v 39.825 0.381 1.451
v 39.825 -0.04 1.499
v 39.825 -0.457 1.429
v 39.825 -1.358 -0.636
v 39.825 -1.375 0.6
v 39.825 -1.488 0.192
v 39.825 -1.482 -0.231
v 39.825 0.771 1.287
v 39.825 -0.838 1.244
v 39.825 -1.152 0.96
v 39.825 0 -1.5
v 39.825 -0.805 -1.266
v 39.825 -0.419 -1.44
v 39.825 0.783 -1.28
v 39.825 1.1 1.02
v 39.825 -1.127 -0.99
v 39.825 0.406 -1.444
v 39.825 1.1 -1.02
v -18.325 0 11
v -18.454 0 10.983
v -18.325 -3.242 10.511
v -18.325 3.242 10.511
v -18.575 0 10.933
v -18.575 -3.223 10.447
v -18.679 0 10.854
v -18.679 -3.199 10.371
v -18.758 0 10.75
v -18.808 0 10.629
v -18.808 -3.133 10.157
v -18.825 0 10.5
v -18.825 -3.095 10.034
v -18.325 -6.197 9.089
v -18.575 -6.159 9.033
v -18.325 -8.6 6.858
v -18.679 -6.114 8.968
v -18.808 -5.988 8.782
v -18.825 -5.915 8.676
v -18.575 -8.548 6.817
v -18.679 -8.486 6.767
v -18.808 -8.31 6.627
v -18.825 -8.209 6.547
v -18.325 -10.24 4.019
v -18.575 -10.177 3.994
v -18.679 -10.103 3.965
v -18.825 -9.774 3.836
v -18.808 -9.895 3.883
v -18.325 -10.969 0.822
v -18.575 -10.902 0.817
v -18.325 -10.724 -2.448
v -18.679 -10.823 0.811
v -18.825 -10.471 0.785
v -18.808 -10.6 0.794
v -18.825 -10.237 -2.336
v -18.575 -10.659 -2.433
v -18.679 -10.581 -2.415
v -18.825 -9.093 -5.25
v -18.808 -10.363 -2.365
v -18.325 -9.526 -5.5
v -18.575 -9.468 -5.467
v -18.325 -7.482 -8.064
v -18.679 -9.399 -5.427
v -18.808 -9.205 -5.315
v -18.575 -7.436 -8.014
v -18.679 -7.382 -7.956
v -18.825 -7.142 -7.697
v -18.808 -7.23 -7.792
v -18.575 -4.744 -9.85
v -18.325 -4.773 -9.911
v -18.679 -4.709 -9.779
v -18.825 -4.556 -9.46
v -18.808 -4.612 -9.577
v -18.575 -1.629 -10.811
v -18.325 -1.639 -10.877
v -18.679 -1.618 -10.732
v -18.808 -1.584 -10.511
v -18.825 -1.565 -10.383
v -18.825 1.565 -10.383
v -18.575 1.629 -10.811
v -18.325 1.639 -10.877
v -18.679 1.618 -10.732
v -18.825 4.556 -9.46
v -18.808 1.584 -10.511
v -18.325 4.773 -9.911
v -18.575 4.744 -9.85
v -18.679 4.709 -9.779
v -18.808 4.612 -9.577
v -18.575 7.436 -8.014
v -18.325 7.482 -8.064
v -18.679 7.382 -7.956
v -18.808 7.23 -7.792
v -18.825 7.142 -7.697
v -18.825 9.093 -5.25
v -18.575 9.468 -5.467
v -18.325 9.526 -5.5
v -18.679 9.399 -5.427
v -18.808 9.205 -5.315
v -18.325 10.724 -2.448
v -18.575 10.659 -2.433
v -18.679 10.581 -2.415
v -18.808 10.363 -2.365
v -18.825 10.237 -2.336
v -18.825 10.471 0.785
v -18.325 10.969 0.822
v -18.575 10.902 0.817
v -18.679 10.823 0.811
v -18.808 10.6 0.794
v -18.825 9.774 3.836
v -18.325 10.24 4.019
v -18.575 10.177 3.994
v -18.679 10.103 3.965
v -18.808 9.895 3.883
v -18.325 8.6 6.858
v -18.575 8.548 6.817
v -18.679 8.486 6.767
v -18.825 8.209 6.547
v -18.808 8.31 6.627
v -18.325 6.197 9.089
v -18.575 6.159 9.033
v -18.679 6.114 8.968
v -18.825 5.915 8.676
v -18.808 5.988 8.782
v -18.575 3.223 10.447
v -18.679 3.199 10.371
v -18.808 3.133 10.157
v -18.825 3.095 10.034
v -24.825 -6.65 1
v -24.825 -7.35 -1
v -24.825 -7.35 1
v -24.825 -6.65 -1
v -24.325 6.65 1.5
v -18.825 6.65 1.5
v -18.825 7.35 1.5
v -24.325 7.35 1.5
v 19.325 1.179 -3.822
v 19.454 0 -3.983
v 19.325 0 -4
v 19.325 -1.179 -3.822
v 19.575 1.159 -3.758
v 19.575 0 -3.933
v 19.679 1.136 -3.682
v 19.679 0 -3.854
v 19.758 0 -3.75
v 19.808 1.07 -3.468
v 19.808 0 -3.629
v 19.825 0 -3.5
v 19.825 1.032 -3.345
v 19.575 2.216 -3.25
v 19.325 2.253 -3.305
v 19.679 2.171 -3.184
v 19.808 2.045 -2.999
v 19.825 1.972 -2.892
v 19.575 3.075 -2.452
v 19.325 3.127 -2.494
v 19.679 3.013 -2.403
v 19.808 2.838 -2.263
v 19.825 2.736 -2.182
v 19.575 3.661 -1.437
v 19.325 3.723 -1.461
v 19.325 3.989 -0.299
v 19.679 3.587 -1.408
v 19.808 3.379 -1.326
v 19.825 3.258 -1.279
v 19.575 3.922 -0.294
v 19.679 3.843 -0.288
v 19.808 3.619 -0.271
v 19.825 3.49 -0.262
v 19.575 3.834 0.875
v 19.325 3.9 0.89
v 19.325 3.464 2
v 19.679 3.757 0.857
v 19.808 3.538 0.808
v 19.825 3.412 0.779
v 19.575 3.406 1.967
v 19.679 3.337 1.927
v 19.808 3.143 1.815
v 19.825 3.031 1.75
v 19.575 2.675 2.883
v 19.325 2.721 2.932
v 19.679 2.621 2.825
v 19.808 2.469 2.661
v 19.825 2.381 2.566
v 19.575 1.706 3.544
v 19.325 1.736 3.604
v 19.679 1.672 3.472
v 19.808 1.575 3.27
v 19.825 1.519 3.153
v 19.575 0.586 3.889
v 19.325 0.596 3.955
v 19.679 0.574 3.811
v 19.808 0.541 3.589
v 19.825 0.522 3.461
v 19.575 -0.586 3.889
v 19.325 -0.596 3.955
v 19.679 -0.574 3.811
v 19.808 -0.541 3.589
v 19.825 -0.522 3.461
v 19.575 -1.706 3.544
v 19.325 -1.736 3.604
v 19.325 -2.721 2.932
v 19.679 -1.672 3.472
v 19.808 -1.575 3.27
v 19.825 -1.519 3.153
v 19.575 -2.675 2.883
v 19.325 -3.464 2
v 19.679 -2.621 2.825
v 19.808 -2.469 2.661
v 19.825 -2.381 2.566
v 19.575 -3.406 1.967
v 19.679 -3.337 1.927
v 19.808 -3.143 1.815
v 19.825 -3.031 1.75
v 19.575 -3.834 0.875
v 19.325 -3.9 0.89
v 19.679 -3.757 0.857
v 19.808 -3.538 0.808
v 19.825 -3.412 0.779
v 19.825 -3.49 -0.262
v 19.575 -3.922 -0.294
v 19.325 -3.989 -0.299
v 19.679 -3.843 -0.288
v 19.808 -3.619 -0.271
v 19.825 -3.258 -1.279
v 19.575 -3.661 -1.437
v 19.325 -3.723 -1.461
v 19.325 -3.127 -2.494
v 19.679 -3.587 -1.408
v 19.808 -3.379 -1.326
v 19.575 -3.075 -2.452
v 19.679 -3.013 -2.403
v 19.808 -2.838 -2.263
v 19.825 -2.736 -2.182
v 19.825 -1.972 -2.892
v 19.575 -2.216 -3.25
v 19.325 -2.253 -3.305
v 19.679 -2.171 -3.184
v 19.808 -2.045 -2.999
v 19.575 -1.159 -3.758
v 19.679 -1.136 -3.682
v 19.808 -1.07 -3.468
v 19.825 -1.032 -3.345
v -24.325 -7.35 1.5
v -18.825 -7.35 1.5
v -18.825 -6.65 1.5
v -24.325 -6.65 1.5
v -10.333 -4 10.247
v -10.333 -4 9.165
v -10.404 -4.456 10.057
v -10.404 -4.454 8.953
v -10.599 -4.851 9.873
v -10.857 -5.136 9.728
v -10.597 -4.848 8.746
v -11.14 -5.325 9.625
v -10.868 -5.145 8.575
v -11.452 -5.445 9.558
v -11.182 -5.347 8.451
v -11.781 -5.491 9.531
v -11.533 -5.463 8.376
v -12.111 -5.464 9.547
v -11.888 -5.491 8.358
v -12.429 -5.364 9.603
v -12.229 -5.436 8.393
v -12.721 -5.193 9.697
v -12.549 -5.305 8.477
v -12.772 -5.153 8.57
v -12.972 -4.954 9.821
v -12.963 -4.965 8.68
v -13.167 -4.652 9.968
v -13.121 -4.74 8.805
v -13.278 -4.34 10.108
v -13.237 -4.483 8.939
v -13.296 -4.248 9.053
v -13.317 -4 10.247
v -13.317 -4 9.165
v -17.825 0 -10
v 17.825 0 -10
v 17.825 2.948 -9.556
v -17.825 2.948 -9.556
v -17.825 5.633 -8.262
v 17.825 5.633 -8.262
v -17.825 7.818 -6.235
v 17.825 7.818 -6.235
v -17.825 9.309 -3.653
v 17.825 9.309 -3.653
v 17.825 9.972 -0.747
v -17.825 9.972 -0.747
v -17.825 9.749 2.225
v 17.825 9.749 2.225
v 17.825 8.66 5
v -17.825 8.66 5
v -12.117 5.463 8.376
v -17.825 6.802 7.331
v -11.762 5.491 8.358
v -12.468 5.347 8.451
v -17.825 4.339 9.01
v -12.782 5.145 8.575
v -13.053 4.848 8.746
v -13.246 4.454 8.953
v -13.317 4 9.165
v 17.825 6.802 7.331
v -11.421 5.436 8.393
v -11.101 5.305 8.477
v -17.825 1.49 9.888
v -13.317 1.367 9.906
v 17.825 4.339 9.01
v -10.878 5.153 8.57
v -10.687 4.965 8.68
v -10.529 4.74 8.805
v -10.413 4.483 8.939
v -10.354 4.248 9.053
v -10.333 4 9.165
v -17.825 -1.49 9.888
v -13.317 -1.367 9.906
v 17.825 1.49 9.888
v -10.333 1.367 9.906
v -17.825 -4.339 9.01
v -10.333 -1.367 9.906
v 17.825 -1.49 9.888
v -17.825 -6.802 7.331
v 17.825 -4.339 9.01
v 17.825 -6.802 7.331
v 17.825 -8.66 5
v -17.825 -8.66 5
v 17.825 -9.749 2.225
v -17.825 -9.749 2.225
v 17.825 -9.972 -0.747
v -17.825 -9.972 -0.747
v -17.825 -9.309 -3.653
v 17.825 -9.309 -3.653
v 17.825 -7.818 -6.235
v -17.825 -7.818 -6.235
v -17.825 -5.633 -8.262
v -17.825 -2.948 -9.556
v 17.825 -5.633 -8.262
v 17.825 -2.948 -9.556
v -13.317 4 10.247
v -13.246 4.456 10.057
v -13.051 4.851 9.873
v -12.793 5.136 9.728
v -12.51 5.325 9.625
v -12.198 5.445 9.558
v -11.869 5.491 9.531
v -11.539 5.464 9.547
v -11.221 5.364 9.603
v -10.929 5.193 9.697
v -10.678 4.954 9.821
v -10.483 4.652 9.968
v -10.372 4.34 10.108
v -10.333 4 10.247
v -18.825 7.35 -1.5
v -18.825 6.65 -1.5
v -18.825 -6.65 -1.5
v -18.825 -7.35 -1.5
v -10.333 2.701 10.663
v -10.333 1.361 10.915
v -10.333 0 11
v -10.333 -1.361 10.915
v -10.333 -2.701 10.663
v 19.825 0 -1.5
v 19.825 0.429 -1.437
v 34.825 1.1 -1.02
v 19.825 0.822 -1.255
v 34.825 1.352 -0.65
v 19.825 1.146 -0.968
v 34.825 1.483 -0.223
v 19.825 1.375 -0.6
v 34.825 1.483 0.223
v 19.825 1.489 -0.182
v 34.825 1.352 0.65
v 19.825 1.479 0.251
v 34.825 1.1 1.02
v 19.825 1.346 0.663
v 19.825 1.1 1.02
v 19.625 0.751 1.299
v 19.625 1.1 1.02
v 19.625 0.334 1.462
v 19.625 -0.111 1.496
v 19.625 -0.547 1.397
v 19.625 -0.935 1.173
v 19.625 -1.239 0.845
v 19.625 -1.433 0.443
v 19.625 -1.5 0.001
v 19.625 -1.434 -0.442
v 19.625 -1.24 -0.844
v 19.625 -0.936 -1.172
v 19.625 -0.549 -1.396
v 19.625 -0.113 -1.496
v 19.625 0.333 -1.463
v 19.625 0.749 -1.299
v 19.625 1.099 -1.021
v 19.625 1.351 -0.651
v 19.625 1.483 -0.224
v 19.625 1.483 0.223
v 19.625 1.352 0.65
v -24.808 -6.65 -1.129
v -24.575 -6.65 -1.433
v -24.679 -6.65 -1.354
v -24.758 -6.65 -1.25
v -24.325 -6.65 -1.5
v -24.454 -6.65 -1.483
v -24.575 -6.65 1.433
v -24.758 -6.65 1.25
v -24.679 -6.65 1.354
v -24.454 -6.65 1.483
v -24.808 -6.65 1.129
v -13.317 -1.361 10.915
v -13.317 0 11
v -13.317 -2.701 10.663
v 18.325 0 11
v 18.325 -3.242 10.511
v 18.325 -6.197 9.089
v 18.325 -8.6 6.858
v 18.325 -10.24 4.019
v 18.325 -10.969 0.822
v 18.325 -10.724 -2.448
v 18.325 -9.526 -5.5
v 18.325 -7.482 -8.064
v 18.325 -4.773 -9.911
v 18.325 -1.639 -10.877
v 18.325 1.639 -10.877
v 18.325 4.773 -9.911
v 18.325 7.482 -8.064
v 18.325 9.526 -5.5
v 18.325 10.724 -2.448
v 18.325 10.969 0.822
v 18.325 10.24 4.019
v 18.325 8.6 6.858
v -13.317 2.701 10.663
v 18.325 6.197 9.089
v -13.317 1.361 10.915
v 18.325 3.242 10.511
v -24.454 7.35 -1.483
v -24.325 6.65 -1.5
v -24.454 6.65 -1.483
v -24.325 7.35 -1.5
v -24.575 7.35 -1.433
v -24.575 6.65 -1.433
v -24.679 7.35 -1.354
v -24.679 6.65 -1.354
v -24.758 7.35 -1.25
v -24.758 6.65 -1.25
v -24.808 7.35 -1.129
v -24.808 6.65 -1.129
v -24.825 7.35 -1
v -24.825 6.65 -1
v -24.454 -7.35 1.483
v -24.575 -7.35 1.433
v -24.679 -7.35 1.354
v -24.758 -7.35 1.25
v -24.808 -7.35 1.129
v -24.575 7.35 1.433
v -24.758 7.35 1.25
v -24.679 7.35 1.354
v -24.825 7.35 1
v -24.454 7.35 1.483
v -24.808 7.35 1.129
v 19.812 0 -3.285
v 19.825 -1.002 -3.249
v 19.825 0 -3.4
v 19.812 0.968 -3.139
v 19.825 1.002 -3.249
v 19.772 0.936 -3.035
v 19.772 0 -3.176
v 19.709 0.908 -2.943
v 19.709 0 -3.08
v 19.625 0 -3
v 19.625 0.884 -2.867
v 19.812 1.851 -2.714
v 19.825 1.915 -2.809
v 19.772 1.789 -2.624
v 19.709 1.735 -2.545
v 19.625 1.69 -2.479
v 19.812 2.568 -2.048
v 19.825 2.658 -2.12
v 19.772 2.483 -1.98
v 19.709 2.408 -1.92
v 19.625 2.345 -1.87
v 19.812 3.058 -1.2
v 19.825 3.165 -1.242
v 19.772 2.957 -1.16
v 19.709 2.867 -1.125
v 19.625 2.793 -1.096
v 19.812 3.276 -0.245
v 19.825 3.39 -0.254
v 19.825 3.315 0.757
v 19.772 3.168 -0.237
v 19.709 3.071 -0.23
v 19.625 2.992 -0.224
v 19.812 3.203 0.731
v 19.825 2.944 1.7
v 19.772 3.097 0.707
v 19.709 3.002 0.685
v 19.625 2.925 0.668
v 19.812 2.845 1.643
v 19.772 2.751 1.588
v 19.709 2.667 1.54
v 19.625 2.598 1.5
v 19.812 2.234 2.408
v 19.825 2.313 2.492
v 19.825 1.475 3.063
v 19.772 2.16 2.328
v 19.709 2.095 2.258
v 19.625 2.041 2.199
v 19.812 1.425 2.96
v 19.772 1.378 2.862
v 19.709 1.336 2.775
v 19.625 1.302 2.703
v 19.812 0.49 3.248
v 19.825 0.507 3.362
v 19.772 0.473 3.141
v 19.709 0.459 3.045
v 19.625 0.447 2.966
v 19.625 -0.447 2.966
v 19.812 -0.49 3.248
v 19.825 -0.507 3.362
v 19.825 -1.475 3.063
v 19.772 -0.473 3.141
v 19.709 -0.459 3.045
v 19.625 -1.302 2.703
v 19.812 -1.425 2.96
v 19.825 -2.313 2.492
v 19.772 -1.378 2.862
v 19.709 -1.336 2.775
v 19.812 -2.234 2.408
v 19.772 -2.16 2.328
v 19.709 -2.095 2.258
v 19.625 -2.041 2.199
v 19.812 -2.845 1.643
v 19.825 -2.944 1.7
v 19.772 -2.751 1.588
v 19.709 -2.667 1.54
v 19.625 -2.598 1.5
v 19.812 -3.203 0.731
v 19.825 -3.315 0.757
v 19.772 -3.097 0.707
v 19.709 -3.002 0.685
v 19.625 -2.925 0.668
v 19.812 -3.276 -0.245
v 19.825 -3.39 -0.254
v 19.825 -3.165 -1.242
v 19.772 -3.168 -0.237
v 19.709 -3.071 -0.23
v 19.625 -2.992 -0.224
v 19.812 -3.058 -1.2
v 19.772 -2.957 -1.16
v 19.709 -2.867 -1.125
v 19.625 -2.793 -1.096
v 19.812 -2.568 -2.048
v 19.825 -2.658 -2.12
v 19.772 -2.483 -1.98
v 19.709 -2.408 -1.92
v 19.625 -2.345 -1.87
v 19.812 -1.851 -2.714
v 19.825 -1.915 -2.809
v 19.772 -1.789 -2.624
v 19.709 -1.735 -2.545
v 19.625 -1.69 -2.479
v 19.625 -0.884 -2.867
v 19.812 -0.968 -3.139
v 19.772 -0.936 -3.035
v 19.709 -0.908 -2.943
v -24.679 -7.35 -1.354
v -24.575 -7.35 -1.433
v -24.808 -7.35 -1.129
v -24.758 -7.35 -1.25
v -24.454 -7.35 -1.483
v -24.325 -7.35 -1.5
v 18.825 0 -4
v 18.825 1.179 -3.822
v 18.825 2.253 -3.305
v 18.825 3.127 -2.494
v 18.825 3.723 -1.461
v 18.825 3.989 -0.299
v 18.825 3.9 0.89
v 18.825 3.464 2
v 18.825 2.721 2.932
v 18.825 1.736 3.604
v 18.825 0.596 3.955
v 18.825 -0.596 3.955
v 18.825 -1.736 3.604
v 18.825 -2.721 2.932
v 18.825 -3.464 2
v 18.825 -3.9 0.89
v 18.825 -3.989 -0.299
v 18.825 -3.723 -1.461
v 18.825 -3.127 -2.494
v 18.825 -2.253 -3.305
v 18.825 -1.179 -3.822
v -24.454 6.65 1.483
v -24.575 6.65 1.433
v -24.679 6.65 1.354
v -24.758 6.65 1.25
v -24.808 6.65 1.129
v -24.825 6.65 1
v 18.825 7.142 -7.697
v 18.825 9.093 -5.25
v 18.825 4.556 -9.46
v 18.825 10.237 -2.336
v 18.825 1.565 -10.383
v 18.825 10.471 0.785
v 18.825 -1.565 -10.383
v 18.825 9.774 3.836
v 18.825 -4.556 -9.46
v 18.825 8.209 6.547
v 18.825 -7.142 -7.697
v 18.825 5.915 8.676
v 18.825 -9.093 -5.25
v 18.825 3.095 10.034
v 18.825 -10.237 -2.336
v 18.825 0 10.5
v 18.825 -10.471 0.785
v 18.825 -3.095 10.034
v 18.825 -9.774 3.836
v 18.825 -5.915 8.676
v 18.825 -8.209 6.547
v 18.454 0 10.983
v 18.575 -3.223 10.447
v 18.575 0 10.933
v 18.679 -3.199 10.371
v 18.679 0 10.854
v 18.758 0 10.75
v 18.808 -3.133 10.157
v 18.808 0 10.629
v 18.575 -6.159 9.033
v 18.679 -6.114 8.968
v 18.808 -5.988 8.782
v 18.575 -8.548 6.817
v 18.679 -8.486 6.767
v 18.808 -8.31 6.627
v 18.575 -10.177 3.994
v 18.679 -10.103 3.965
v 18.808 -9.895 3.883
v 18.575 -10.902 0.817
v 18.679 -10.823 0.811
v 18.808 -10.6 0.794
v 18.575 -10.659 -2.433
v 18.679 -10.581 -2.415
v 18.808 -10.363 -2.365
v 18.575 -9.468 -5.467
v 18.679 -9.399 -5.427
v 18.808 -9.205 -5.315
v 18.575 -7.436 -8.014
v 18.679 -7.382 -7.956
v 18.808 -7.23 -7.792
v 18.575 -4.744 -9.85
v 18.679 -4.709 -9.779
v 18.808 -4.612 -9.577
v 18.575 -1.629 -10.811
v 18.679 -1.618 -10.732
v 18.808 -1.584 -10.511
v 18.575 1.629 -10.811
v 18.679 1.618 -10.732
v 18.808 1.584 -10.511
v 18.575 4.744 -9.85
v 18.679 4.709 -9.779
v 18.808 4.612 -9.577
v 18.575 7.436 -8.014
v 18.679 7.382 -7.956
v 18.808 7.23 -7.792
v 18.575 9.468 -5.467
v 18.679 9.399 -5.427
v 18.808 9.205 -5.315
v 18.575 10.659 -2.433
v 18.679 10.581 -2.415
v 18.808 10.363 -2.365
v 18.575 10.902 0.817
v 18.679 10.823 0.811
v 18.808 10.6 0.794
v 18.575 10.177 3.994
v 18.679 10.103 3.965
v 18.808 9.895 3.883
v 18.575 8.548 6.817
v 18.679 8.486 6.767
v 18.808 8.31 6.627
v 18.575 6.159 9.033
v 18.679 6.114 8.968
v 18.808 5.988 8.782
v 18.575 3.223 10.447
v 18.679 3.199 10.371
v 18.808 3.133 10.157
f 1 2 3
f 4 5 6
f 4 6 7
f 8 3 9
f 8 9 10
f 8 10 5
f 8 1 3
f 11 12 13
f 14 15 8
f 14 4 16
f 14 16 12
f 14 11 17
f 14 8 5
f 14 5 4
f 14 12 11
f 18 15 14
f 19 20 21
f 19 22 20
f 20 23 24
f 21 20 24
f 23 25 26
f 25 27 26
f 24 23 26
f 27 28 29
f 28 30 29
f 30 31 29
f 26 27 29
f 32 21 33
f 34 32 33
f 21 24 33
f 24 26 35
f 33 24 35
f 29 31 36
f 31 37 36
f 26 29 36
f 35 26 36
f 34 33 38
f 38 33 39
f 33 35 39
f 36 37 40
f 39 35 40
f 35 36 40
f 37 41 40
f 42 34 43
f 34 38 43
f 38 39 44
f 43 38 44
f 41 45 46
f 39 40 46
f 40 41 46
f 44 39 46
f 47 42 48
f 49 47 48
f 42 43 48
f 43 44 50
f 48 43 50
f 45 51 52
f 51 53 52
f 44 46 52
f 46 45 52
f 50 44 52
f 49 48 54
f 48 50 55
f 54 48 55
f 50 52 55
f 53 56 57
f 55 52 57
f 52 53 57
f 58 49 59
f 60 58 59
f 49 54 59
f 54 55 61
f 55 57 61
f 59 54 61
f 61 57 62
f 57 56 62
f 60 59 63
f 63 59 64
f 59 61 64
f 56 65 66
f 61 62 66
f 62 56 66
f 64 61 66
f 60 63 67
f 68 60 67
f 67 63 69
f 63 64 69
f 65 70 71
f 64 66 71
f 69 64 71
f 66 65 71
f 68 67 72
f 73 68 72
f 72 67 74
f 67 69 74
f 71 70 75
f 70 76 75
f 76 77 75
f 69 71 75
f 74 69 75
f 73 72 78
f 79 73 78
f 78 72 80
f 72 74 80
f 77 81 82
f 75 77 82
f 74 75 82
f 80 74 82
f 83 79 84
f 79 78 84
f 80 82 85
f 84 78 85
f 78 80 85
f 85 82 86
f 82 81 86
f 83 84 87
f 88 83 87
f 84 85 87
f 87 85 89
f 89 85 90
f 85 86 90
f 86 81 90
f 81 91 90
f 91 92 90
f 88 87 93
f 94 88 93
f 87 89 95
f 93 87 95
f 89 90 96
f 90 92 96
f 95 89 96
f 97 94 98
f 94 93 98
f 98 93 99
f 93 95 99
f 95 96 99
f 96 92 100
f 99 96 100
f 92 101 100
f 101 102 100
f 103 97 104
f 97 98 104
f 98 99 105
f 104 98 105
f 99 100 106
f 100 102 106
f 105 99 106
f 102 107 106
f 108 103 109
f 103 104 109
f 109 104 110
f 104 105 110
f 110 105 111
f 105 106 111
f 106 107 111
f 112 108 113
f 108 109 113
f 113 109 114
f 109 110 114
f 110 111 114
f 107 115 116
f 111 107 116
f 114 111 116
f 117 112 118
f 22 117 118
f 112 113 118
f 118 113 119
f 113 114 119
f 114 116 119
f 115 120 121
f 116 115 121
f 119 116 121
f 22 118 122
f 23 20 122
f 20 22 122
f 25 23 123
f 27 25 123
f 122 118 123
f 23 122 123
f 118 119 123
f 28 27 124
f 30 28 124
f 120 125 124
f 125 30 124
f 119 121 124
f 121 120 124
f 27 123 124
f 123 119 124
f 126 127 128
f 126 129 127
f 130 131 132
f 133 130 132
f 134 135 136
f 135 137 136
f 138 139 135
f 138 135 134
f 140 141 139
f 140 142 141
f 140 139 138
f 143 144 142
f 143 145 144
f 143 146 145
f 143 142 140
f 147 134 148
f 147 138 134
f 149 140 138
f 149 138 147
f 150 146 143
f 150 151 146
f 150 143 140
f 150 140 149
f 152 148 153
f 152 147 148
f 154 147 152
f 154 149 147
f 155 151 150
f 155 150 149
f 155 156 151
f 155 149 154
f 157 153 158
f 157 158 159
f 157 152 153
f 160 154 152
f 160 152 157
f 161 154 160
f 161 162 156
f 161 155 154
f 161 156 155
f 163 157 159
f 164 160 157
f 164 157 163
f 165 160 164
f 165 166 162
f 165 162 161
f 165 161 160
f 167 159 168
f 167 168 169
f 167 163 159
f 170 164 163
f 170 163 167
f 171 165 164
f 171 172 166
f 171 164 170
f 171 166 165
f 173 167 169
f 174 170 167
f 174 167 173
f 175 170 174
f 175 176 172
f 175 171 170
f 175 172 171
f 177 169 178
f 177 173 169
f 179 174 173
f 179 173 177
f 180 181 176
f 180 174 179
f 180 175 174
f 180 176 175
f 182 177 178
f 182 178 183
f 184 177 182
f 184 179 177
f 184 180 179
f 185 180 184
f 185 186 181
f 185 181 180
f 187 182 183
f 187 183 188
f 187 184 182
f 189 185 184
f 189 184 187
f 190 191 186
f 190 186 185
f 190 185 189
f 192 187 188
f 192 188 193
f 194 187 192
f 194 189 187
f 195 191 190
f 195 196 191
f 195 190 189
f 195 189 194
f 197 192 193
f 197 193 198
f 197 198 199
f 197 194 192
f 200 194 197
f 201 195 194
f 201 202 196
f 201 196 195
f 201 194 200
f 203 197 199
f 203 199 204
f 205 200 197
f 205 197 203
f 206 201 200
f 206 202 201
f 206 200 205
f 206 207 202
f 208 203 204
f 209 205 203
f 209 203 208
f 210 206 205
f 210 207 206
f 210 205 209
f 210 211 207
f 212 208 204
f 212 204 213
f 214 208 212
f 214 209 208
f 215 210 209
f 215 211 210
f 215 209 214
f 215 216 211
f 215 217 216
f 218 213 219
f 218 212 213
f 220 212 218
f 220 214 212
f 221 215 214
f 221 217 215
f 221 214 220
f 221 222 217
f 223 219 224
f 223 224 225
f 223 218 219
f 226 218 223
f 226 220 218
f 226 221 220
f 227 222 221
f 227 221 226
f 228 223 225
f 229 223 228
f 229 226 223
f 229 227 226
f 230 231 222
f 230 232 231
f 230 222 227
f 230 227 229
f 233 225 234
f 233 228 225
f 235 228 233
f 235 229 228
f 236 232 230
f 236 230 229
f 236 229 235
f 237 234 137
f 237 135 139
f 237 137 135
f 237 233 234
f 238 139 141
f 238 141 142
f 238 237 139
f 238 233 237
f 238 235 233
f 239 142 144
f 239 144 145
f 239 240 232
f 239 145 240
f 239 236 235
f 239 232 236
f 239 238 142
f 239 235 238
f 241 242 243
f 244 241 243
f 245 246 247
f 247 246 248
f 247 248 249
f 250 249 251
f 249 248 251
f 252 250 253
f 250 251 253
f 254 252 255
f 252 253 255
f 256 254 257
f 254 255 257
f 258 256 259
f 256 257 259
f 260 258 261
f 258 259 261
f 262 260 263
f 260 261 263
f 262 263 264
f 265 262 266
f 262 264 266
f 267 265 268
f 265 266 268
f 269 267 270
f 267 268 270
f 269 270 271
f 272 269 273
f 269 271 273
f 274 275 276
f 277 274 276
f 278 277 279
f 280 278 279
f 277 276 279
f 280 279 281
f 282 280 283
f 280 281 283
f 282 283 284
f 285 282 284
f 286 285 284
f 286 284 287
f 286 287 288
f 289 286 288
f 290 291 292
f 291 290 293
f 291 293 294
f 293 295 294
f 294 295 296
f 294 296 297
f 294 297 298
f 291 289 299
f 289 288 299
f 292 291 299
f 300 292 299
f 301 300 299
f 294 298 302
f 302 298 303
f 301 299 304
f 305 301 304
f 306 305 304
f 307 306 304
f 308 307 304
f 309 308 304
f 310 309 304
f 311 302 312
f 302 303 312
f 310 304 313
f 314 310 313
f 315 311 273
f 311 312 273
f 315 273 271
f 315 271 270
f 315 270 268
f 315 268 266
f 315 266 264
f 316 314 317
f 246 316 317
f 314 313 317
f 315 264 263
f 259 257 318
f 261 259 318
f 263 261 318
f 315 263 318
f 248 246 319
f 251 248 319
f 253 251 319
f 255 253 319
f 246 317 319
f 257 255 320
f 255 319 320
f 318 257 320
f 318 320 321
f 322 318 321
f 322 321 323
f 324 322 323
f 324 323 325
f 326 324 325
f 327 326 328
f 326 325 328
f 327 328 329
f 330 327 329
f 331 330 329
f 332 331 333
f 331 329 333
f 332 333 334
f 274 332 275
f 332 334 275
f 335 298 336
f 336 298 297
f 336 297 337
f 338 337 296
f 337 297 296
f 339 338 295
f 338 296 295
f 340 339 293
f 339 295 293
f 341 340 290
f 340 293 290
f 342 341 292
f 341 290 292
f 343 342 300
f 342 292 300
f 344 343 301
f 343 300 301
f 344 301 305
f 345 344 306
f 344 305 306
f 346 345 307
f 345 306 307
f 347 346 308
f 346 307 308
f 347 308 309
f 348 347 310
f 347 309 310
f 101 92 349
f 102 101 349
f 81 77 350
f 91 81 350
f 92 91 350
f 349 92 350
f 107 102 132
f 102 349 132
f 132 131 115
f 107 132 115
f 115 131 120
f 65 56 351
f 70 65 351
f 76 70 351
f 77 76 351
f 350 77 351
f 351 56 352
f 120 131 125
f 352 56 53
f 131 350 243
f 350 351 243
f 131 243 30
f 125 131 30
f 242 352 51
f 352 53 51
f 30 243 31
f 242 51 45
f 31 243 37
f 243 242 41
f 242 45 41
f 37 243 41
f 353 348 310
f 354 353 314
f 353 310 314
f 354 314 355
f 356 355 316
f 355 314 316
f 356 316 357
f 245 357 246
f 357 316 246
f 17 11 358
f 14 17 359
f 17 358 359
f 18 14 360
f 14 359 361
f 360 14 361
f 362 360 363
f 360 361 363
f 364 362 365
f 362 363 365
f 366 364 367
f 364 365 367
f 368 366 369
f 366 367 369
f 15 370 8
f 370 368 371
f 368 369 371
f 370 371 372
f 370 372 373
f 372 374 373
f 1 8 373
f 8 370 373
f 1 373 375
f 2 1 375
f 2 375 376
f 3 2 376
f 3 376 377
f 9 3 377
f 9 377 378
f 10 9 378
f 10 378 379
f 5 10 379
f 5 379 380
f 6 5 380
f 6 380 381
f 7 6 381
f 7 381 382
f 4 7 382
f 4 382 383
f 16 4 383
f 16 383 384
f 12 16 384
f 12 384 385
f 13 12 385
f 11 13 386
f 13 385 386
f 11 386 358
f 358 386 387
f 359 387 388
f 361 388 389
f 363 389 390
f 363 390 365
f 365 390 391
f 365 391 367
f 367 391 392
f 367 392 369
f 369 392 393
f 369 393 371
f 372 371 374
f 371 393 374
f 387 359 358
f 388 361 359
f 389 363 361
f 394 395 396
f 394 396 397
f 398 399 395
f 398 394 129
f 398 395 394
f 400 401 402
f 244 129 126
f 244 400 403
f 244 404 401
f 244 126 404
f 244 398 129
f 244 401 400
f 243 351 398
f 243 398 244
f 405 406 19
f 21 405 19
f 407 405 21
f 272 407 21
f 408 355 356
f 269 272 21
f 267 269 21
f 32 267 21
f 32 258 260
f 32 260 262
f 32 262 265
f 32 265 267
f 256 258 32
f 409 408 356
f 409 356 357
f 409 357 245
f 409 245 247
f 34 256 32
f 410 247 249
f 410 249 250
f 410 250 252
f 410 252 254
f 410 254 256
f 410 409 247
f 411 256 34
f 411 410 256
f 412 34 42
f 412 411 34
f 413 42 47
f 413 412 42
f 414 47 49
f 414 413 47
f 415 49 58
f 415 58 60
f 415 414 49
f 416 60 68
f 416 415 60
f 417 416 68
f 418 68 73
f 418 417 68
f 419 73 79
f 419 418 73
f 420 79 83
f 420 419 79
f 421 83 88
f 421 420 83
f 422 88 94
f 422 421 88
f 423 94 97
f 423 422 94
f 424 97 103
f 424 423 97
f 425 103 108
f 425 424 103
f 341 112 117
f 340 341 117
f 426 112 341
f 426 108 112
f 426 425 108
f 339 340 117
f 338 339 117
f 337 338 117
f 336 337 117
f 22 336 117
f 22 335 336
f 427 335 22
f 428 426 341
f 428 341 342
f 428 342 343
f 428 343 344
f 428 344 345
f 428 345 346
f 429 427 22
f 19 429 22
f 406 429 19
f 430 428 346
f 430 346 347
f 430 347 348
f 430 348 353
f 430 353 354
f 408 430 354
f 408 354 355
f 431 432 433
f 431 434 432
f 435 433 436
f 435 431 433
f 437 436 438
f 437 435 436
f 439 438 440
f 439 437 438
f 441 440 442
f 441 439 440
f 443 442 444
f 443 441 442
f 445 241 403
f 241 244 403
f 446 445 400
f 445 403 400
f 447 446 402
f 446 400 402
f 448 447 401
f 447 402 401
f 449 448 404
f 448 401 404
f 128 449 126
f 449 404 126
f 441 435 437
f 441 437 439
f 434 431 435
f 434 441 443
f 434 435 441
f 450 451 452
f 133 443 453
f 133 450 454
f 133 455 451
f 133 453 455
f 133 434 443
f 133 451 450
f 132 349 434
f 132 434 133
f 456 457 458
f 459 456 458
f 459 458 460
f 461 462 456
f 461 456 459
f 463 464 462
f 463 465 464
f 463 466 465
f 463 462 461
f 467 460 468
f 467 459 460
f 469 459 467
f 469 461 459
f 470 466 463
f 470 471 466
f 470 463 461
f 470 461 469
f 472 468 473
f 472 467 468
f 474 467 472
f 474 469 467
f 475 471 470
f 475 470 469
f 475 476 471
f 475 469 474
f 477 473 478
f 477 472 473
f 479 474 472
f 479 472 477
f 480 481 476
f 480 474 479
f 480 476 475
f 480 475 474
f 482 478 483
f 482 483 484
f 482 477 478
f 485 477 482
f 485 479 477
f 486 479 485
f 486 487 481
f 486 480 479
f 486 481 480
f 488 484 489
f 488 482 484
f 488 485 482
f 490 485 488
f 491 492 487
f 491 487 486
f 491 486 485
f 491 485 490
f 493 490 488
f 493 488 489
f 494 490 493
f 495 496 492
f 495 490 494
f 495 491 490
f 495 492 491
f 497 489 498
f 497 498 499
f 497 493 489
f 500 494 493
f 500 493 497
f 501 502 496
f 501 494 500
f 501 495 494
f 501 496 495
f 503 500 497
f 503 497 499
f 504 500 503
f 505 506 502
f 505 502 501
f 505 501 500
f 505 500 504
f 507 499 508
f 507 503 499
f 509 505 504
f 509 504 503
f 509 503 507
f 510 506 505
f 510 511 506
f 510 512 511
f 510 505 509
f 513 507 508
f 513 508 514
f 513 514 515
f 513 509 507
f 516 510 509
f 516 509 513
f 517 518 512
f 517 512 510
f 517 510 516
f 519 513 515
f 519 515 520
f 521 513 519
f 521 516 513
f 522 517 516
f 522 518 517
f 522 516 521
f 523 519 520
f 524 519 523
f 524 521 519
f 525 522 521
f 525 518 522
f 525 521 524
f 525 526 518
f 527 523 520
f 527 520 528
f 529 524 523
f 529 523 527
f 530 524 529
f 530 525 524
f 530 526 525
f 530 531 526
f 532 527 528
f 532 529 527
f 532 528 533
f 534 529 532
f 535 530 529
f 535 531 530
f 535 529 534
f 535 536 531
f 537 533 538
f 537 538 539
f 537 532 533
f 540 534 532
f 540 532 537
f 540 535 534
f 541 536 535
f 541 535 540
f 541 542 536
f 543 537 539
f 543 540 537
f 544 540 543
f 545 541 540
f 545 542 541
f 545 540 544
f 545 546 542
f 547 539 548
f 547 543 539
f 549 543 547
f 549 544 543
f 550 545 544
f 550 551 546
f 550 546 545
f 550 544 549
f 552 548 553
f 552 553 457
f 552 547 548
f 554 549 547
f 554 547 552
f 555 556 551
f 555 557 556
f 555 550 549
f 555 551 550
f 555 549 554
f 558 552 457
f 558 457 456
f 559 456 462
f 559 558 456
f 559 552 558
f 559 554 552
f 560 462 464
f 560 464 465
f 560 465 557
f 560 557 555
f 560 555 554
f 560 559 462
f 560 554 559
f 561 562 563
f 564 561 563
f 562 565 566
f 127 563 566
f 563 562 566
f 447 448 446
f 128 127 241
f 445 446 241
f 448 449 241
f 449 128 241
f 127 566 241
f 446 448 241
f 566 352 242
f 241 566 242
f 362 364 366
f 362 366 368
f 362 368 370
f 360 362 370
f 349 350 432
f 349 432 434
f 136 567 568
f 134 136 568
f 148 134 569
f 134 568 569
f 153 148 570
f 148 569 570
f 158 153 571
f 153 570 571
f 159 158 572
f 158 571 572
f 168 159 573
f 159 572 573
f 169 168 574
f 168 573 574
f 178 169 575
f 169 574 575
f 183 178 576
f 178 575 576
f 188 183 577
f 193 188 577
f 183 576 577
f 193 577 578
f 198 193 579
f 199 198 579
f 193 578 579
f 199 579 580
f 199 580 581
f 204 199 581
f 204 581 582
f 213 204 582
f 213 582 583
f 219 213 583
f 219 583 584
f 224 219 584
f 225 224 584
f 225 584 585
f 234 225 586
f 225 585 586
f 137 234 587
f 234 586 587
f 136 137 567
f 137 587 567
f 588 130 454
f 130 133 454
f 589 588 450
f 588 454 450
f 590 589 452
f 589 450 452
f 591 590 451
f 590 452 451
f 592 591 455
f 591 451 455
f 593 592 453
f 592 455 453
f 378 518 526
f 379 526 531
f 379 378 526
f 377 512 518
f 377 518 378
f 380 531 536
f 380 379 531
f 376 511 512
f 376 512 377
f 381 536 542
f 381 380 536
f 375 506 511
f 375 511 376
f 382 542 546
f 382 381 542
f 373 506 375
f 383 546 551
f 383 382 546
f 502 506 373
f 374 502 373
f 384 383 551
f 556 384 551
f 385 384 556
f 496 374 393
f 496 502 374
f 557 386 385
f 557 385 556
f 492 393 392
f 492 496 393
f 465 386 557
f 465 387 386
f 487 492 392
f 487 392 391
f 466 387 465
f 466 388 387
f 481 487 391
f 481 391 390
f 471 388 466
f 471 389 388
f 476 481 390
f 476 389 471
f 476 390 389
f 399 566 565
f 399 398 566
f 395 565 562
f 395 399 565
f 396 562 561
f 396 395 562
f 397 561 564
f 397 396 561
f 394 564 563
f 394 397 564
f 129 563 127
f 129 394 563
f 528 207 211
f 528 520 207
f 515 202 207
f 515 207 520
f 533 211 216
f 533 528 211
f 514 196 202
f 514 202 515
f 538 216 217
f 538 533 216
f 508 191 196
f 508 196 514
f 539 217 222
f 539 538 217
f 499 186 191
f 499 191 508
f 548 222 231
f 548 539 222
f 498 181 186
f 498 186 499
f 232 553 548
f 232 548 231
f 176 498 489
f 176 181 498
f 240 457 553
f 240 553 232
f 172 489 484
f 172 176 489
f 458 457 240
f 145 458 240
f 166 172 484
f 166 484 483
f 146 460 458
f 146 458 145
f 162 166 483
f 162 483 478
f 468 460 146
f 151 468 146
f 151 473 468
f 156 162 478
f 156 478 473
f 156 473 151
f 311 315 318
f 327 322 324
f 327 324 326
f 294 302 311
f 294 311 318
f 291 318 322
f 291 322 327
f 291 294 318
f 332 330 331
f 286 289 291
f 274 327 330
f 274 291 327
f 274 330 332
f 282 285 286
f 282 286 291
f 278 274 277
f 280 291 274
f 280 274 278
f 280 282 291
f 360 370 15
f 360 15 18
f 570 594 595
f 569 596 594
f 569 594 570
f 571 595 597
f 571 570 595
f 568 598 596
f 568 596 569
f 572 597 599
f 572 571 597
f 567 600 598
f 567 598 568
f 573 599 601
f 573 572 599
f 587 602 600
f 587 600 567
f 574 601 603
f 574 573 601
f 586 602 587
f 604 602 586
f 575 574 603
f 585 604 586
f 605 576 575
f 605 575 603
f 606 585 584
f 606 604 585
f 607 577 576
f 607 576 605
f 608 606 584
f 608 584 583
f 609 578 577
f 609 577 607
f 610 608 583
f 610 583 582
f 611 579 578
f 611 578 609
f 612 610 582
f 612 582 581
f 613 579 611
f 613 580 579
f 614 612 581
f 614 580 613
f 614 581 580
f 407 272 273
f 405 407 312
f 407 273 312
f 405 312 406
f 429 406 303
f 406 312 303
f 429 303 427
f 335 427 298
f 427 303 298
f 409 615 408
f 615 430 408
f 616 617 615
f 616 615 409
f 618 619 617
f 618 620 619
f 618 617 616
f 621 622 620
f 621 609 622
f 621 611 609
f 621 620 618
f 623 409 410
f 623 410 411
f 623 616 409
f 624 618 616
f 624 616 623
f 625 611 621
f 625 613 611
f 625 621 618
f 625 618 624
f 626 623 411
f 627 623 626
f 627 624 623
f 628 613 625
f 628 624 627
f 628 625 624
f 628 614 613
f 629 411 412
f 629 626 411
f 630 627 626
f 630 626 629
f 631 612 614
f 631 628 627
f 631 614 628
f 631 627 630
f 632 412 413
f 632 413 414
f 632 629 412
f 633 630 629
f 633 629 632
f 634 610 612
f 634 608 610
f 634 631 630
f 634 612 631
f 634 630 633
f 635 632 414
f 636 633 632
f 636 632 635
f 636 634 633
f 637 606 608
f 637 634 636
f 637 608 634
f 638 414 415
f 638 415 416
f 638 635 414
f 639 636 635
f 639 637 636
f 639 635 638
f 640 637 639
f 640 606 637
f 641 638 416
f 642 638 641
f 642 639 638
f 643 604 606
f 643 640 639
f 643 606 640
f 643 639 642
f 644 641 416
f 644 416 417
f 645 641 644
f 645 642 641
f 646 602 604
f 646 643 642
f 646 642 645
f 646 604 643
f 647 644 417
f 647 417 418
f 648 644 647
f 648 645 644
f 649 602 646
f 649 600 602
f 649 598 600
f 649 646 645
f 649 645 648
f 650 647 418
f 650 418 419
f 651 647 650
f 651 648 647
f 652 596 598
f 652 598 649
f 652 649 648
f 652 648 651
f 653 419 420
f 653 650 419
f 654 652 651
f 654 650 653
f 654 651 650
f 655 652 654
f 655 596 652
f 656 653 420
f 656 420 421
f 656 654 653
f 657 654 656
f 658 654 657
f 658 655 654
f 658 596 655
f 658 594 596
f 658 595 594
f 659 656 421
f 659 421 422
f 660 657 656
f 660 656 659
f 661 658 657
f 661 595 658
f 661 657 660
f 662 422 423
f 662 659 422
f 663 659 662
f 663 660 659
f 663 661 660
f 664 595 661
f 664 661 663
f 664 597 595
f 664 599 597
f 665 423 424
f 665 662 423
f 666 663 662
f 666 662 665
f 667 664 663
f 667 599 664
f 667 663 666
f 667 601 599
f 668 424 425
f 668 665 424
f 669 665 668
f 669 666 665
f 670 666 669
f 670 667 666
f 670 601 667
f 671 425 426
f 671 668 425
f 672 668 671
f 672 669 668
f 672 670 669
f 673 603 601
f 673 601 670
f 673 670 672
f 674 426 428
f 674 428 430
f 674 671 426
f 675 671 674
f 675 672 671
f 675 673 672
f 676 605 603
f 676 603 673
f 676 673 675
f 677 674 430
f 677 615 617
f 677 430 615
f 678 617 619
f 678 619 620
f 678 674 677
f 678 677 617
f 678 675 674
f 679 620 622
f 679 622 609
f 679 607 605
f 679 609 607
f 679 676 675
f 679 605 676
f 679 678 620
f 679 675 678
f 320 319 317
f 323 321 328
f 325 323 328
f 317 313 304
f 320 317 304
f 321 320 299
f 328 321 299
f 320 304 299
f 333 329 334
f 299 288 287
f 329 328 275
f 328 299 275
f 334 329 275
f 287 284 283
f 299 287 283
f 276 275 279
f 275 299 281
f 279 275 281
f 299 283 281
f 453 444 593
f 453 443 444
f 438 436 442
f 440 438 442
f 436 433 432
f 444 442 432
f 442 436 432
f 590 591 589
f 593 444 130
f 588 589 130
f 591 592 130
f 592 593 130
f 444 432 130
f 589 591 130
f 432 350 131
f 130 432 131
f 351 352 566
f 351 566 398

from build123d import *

# Parameters (mm, degrees)
SKETCH_1_R          = 11
EXTRUDE_1_DEPTH     = 18.825
SKETCH_3_R          = 10
CUT_EXTRUDE_1_DEPTH = 17.825
CUT_EXTRUDE_2_DEPTH = 25.420905491
FILLET_1_R          = 0.5
SKETCH_5_W          = 3
SKETCH_5_H          = 0.7
EXTRUDE_2_DEPTH     = 6
FILLET_2_R          = 0.5
SKETCH_7_R          = 3.5
EXTRUDE_3_DEPTH     = 1
SKETCH_8_R          = 1.5
EXTRUDE_4_DEPTH     = 20
CUT_EXTRUDE_START   = -5
CUT_EXTRUDE_3_DEPTH = 5
SKETCH_10_R         = 4
EXTRUDE_5_DEPTH     = 1
FILLET_4_R          = 0.5
CUT_EXTRUDE_START_2 = -0.2
SKETCH_11_R         = 3
SKETCH_11_R_2       = 1.5
CUT_EXTRUDE_4_DEPTH = 0.2
FILLET_5_R          = 0.5


with BuildPart() as part:
    # 草图1 → 凸台-拉伸1 (new, symmetric)
    with BuildSketch(Plane(origin=(0, 0, 0), x_dir=(0, 0, -1), z_dir=(1, 0, 0))):
        with Locations(Location((0, 0, 0), (0, 0, 180))):
            Circle(SKETCH_1_R)
    extrude(amount=EXTRUDE_1_DEPTH, both=True)

    # 草图3 → 切除-拉伸1 (cut, symmetric)
    with BuildSketch(Plane(origin=(0, 0, 0), x_dir=(0, 0, -1), z_dir=(1, 0, 0))):
        Circle(SKETCH_3_R)
    extrude(amount=CUT_EXTRUDE_1_DEPTH, both=True, mode=Mode.SUBTRACT)

    # 草图4 → 切除-拉伸2 (cut, through all)
    with BuildSketch(Plane.XY):
        with BuildLine():
            Line((-10.332925503, 4), (-10.332925503, -4))
            ThreePointArc((-10.332925503, -4), (-11.825, -5.492074497), (-13.317074497, -4))
            Line((-13.317074497, -4), (-13.317074497, 4))
            ThreePointArc((-13.317074497, 4), (-11.825, 5.492074497), (-10.332925503, 4))
        make_face()
    extrude(amount=CUT_EXTRUDE_2_DEPTH, mode=Mode.SUBTRACT)

    # 圆角1
    fillet_1_edges = [part.edges().sort_by_distance(p)[0] for p in [
        (-18.825, 0, -11),
        (18.825, 0, -11),
    ]]
    fillet(fillet_1_edges, radius=FILLET_1_R)

    # 草图5 → 凸台-拉伸2 (add)
    with BuildSketch(Plane.ZY.offset(18.825)):
        with Locations((0, 7)):
            Rectangle(SKETCH_5_W, SKETCH_5_H)
        with Locations((0, -7)):
            Rectangle(SKETCH_5_W, SKETCH_5_H)
    extrude(amount=EXTRUDE_2_DEPTH)

    # 圆角2
    fillet_2_edges = [part.edges().sort_by_distance(p)[0] for p in [
        (-24.825, 7, 1.5),
        (-24.825, 7, -1.5),
        (-24.825, -7, -1.5),
        (-24.825, -7, 1.5),
    ]]
    fillet(fillet_2_edges, radius=FILLET_2_R)

    # 草图7 → 凸台-拉伸3 (add)
    with BuildSketch(Plane(origin=(18.825, 0, 0), x_dir=(0, 0, -1), z_dir=(1, 0, 0))):
        Circle(SKETCH_7_R)
    extrude(amount=EXTRUDE_3_DEPTH)

    # 草图8 → 凸台-拉伸4 (add)
    with BuildSketch(Plane(origin=(19.825, 0, 0), x_dir=(0, 0, -1), z_dir=(1, 0, 0))):
        Circle(SKETCH_8_R)
    extrude(amount=EXTRUDE_4_DEPTH)

    # 草图9 → 切除-拉伸3 (cut)
    with BuildSketch(Plane(origin=(39.825, 0, 0), x_dir=(0, 0, -1), z_dir=(1, 0, 0)).offset(CUT_EXTRUDE_START)):
        with BuildLine():
            Line((-1.019803903, 1.1), (1.019803903, 1.1))
            ThreePointArc((1.019803903, 1.1), (0, 1.5), (-1.019803903, 1.1))
        make_face()
    extrude(amount=CUT_EXTRUDE_3_DEPTH, mode=Mode.SUBTRACT)

    # 草图10 → 凸台-拉伸5 (add)
    with BuildSketch(Plane(origin=(18.825, 0, 0), x_dir=(0, 0, -1), z_dir=(1, 0, 0))):
        Circle(SKETCH_10_R)
    extrude(amount=EXTRUDE_5_DEPTH)

    # 圆角4
    fillet_4_edges = [part.edges().sort_by_distance(p)[0] for p in [
        (19.825, 0, 4),
    ]]
    fillet(fillet_4_edges, radius=FILLET_4_R)

    # 草图11 → 切除-拉伸4 (cut)
    with BuildSketch(Plane(origin=(19.825, 0, 0), x_dir=(0, 0, -1), z_dir=(1, 0, 0)).offset(CUT_EXTRUDE_START_2)):
        Circle(SKETCH_11_R)
        with Locations(Location((0, 0, 0), (0, 0, 132.833428066))):
            Circle(SKETCH_11_R_2, mode=Mode.SUBTRACT)
    extrude(amount=CUT_EXTRUDE_4_DEPTH, mode=Mode.SUBTRACT)

    # 圆角5
    # the kernel refuses this fillet: 0.5 mm, written as the material it takes off along each edge
    with BuildSketch(Plane(origin=(19.825, 0, 0), x_dir=(0, 0, -1), z_dir=(0, -1, 0))) as fillet_5_piece_1:
        with BuildLine():
            CenterArc((3.4, -0.5), FILLET_5_R, 90, 53.130102355)
            Line((3, -0.2), (2.992, -0.194))
            ThreePointArc((2.992, -0.194), (2.99, -0.1), (2.99, 0))
            Line((2.99, 0), (3, 0.01))
            Line((3, 0.01), (3.4, 0.01))
            Line((3.4, 0.01), (3.4, 0))
        make_face()
    revolve(axis=Axis((19.825, 0, 0), (1, 0, 0)), mode=Mode.SUBTRACT)


solid = part.part
